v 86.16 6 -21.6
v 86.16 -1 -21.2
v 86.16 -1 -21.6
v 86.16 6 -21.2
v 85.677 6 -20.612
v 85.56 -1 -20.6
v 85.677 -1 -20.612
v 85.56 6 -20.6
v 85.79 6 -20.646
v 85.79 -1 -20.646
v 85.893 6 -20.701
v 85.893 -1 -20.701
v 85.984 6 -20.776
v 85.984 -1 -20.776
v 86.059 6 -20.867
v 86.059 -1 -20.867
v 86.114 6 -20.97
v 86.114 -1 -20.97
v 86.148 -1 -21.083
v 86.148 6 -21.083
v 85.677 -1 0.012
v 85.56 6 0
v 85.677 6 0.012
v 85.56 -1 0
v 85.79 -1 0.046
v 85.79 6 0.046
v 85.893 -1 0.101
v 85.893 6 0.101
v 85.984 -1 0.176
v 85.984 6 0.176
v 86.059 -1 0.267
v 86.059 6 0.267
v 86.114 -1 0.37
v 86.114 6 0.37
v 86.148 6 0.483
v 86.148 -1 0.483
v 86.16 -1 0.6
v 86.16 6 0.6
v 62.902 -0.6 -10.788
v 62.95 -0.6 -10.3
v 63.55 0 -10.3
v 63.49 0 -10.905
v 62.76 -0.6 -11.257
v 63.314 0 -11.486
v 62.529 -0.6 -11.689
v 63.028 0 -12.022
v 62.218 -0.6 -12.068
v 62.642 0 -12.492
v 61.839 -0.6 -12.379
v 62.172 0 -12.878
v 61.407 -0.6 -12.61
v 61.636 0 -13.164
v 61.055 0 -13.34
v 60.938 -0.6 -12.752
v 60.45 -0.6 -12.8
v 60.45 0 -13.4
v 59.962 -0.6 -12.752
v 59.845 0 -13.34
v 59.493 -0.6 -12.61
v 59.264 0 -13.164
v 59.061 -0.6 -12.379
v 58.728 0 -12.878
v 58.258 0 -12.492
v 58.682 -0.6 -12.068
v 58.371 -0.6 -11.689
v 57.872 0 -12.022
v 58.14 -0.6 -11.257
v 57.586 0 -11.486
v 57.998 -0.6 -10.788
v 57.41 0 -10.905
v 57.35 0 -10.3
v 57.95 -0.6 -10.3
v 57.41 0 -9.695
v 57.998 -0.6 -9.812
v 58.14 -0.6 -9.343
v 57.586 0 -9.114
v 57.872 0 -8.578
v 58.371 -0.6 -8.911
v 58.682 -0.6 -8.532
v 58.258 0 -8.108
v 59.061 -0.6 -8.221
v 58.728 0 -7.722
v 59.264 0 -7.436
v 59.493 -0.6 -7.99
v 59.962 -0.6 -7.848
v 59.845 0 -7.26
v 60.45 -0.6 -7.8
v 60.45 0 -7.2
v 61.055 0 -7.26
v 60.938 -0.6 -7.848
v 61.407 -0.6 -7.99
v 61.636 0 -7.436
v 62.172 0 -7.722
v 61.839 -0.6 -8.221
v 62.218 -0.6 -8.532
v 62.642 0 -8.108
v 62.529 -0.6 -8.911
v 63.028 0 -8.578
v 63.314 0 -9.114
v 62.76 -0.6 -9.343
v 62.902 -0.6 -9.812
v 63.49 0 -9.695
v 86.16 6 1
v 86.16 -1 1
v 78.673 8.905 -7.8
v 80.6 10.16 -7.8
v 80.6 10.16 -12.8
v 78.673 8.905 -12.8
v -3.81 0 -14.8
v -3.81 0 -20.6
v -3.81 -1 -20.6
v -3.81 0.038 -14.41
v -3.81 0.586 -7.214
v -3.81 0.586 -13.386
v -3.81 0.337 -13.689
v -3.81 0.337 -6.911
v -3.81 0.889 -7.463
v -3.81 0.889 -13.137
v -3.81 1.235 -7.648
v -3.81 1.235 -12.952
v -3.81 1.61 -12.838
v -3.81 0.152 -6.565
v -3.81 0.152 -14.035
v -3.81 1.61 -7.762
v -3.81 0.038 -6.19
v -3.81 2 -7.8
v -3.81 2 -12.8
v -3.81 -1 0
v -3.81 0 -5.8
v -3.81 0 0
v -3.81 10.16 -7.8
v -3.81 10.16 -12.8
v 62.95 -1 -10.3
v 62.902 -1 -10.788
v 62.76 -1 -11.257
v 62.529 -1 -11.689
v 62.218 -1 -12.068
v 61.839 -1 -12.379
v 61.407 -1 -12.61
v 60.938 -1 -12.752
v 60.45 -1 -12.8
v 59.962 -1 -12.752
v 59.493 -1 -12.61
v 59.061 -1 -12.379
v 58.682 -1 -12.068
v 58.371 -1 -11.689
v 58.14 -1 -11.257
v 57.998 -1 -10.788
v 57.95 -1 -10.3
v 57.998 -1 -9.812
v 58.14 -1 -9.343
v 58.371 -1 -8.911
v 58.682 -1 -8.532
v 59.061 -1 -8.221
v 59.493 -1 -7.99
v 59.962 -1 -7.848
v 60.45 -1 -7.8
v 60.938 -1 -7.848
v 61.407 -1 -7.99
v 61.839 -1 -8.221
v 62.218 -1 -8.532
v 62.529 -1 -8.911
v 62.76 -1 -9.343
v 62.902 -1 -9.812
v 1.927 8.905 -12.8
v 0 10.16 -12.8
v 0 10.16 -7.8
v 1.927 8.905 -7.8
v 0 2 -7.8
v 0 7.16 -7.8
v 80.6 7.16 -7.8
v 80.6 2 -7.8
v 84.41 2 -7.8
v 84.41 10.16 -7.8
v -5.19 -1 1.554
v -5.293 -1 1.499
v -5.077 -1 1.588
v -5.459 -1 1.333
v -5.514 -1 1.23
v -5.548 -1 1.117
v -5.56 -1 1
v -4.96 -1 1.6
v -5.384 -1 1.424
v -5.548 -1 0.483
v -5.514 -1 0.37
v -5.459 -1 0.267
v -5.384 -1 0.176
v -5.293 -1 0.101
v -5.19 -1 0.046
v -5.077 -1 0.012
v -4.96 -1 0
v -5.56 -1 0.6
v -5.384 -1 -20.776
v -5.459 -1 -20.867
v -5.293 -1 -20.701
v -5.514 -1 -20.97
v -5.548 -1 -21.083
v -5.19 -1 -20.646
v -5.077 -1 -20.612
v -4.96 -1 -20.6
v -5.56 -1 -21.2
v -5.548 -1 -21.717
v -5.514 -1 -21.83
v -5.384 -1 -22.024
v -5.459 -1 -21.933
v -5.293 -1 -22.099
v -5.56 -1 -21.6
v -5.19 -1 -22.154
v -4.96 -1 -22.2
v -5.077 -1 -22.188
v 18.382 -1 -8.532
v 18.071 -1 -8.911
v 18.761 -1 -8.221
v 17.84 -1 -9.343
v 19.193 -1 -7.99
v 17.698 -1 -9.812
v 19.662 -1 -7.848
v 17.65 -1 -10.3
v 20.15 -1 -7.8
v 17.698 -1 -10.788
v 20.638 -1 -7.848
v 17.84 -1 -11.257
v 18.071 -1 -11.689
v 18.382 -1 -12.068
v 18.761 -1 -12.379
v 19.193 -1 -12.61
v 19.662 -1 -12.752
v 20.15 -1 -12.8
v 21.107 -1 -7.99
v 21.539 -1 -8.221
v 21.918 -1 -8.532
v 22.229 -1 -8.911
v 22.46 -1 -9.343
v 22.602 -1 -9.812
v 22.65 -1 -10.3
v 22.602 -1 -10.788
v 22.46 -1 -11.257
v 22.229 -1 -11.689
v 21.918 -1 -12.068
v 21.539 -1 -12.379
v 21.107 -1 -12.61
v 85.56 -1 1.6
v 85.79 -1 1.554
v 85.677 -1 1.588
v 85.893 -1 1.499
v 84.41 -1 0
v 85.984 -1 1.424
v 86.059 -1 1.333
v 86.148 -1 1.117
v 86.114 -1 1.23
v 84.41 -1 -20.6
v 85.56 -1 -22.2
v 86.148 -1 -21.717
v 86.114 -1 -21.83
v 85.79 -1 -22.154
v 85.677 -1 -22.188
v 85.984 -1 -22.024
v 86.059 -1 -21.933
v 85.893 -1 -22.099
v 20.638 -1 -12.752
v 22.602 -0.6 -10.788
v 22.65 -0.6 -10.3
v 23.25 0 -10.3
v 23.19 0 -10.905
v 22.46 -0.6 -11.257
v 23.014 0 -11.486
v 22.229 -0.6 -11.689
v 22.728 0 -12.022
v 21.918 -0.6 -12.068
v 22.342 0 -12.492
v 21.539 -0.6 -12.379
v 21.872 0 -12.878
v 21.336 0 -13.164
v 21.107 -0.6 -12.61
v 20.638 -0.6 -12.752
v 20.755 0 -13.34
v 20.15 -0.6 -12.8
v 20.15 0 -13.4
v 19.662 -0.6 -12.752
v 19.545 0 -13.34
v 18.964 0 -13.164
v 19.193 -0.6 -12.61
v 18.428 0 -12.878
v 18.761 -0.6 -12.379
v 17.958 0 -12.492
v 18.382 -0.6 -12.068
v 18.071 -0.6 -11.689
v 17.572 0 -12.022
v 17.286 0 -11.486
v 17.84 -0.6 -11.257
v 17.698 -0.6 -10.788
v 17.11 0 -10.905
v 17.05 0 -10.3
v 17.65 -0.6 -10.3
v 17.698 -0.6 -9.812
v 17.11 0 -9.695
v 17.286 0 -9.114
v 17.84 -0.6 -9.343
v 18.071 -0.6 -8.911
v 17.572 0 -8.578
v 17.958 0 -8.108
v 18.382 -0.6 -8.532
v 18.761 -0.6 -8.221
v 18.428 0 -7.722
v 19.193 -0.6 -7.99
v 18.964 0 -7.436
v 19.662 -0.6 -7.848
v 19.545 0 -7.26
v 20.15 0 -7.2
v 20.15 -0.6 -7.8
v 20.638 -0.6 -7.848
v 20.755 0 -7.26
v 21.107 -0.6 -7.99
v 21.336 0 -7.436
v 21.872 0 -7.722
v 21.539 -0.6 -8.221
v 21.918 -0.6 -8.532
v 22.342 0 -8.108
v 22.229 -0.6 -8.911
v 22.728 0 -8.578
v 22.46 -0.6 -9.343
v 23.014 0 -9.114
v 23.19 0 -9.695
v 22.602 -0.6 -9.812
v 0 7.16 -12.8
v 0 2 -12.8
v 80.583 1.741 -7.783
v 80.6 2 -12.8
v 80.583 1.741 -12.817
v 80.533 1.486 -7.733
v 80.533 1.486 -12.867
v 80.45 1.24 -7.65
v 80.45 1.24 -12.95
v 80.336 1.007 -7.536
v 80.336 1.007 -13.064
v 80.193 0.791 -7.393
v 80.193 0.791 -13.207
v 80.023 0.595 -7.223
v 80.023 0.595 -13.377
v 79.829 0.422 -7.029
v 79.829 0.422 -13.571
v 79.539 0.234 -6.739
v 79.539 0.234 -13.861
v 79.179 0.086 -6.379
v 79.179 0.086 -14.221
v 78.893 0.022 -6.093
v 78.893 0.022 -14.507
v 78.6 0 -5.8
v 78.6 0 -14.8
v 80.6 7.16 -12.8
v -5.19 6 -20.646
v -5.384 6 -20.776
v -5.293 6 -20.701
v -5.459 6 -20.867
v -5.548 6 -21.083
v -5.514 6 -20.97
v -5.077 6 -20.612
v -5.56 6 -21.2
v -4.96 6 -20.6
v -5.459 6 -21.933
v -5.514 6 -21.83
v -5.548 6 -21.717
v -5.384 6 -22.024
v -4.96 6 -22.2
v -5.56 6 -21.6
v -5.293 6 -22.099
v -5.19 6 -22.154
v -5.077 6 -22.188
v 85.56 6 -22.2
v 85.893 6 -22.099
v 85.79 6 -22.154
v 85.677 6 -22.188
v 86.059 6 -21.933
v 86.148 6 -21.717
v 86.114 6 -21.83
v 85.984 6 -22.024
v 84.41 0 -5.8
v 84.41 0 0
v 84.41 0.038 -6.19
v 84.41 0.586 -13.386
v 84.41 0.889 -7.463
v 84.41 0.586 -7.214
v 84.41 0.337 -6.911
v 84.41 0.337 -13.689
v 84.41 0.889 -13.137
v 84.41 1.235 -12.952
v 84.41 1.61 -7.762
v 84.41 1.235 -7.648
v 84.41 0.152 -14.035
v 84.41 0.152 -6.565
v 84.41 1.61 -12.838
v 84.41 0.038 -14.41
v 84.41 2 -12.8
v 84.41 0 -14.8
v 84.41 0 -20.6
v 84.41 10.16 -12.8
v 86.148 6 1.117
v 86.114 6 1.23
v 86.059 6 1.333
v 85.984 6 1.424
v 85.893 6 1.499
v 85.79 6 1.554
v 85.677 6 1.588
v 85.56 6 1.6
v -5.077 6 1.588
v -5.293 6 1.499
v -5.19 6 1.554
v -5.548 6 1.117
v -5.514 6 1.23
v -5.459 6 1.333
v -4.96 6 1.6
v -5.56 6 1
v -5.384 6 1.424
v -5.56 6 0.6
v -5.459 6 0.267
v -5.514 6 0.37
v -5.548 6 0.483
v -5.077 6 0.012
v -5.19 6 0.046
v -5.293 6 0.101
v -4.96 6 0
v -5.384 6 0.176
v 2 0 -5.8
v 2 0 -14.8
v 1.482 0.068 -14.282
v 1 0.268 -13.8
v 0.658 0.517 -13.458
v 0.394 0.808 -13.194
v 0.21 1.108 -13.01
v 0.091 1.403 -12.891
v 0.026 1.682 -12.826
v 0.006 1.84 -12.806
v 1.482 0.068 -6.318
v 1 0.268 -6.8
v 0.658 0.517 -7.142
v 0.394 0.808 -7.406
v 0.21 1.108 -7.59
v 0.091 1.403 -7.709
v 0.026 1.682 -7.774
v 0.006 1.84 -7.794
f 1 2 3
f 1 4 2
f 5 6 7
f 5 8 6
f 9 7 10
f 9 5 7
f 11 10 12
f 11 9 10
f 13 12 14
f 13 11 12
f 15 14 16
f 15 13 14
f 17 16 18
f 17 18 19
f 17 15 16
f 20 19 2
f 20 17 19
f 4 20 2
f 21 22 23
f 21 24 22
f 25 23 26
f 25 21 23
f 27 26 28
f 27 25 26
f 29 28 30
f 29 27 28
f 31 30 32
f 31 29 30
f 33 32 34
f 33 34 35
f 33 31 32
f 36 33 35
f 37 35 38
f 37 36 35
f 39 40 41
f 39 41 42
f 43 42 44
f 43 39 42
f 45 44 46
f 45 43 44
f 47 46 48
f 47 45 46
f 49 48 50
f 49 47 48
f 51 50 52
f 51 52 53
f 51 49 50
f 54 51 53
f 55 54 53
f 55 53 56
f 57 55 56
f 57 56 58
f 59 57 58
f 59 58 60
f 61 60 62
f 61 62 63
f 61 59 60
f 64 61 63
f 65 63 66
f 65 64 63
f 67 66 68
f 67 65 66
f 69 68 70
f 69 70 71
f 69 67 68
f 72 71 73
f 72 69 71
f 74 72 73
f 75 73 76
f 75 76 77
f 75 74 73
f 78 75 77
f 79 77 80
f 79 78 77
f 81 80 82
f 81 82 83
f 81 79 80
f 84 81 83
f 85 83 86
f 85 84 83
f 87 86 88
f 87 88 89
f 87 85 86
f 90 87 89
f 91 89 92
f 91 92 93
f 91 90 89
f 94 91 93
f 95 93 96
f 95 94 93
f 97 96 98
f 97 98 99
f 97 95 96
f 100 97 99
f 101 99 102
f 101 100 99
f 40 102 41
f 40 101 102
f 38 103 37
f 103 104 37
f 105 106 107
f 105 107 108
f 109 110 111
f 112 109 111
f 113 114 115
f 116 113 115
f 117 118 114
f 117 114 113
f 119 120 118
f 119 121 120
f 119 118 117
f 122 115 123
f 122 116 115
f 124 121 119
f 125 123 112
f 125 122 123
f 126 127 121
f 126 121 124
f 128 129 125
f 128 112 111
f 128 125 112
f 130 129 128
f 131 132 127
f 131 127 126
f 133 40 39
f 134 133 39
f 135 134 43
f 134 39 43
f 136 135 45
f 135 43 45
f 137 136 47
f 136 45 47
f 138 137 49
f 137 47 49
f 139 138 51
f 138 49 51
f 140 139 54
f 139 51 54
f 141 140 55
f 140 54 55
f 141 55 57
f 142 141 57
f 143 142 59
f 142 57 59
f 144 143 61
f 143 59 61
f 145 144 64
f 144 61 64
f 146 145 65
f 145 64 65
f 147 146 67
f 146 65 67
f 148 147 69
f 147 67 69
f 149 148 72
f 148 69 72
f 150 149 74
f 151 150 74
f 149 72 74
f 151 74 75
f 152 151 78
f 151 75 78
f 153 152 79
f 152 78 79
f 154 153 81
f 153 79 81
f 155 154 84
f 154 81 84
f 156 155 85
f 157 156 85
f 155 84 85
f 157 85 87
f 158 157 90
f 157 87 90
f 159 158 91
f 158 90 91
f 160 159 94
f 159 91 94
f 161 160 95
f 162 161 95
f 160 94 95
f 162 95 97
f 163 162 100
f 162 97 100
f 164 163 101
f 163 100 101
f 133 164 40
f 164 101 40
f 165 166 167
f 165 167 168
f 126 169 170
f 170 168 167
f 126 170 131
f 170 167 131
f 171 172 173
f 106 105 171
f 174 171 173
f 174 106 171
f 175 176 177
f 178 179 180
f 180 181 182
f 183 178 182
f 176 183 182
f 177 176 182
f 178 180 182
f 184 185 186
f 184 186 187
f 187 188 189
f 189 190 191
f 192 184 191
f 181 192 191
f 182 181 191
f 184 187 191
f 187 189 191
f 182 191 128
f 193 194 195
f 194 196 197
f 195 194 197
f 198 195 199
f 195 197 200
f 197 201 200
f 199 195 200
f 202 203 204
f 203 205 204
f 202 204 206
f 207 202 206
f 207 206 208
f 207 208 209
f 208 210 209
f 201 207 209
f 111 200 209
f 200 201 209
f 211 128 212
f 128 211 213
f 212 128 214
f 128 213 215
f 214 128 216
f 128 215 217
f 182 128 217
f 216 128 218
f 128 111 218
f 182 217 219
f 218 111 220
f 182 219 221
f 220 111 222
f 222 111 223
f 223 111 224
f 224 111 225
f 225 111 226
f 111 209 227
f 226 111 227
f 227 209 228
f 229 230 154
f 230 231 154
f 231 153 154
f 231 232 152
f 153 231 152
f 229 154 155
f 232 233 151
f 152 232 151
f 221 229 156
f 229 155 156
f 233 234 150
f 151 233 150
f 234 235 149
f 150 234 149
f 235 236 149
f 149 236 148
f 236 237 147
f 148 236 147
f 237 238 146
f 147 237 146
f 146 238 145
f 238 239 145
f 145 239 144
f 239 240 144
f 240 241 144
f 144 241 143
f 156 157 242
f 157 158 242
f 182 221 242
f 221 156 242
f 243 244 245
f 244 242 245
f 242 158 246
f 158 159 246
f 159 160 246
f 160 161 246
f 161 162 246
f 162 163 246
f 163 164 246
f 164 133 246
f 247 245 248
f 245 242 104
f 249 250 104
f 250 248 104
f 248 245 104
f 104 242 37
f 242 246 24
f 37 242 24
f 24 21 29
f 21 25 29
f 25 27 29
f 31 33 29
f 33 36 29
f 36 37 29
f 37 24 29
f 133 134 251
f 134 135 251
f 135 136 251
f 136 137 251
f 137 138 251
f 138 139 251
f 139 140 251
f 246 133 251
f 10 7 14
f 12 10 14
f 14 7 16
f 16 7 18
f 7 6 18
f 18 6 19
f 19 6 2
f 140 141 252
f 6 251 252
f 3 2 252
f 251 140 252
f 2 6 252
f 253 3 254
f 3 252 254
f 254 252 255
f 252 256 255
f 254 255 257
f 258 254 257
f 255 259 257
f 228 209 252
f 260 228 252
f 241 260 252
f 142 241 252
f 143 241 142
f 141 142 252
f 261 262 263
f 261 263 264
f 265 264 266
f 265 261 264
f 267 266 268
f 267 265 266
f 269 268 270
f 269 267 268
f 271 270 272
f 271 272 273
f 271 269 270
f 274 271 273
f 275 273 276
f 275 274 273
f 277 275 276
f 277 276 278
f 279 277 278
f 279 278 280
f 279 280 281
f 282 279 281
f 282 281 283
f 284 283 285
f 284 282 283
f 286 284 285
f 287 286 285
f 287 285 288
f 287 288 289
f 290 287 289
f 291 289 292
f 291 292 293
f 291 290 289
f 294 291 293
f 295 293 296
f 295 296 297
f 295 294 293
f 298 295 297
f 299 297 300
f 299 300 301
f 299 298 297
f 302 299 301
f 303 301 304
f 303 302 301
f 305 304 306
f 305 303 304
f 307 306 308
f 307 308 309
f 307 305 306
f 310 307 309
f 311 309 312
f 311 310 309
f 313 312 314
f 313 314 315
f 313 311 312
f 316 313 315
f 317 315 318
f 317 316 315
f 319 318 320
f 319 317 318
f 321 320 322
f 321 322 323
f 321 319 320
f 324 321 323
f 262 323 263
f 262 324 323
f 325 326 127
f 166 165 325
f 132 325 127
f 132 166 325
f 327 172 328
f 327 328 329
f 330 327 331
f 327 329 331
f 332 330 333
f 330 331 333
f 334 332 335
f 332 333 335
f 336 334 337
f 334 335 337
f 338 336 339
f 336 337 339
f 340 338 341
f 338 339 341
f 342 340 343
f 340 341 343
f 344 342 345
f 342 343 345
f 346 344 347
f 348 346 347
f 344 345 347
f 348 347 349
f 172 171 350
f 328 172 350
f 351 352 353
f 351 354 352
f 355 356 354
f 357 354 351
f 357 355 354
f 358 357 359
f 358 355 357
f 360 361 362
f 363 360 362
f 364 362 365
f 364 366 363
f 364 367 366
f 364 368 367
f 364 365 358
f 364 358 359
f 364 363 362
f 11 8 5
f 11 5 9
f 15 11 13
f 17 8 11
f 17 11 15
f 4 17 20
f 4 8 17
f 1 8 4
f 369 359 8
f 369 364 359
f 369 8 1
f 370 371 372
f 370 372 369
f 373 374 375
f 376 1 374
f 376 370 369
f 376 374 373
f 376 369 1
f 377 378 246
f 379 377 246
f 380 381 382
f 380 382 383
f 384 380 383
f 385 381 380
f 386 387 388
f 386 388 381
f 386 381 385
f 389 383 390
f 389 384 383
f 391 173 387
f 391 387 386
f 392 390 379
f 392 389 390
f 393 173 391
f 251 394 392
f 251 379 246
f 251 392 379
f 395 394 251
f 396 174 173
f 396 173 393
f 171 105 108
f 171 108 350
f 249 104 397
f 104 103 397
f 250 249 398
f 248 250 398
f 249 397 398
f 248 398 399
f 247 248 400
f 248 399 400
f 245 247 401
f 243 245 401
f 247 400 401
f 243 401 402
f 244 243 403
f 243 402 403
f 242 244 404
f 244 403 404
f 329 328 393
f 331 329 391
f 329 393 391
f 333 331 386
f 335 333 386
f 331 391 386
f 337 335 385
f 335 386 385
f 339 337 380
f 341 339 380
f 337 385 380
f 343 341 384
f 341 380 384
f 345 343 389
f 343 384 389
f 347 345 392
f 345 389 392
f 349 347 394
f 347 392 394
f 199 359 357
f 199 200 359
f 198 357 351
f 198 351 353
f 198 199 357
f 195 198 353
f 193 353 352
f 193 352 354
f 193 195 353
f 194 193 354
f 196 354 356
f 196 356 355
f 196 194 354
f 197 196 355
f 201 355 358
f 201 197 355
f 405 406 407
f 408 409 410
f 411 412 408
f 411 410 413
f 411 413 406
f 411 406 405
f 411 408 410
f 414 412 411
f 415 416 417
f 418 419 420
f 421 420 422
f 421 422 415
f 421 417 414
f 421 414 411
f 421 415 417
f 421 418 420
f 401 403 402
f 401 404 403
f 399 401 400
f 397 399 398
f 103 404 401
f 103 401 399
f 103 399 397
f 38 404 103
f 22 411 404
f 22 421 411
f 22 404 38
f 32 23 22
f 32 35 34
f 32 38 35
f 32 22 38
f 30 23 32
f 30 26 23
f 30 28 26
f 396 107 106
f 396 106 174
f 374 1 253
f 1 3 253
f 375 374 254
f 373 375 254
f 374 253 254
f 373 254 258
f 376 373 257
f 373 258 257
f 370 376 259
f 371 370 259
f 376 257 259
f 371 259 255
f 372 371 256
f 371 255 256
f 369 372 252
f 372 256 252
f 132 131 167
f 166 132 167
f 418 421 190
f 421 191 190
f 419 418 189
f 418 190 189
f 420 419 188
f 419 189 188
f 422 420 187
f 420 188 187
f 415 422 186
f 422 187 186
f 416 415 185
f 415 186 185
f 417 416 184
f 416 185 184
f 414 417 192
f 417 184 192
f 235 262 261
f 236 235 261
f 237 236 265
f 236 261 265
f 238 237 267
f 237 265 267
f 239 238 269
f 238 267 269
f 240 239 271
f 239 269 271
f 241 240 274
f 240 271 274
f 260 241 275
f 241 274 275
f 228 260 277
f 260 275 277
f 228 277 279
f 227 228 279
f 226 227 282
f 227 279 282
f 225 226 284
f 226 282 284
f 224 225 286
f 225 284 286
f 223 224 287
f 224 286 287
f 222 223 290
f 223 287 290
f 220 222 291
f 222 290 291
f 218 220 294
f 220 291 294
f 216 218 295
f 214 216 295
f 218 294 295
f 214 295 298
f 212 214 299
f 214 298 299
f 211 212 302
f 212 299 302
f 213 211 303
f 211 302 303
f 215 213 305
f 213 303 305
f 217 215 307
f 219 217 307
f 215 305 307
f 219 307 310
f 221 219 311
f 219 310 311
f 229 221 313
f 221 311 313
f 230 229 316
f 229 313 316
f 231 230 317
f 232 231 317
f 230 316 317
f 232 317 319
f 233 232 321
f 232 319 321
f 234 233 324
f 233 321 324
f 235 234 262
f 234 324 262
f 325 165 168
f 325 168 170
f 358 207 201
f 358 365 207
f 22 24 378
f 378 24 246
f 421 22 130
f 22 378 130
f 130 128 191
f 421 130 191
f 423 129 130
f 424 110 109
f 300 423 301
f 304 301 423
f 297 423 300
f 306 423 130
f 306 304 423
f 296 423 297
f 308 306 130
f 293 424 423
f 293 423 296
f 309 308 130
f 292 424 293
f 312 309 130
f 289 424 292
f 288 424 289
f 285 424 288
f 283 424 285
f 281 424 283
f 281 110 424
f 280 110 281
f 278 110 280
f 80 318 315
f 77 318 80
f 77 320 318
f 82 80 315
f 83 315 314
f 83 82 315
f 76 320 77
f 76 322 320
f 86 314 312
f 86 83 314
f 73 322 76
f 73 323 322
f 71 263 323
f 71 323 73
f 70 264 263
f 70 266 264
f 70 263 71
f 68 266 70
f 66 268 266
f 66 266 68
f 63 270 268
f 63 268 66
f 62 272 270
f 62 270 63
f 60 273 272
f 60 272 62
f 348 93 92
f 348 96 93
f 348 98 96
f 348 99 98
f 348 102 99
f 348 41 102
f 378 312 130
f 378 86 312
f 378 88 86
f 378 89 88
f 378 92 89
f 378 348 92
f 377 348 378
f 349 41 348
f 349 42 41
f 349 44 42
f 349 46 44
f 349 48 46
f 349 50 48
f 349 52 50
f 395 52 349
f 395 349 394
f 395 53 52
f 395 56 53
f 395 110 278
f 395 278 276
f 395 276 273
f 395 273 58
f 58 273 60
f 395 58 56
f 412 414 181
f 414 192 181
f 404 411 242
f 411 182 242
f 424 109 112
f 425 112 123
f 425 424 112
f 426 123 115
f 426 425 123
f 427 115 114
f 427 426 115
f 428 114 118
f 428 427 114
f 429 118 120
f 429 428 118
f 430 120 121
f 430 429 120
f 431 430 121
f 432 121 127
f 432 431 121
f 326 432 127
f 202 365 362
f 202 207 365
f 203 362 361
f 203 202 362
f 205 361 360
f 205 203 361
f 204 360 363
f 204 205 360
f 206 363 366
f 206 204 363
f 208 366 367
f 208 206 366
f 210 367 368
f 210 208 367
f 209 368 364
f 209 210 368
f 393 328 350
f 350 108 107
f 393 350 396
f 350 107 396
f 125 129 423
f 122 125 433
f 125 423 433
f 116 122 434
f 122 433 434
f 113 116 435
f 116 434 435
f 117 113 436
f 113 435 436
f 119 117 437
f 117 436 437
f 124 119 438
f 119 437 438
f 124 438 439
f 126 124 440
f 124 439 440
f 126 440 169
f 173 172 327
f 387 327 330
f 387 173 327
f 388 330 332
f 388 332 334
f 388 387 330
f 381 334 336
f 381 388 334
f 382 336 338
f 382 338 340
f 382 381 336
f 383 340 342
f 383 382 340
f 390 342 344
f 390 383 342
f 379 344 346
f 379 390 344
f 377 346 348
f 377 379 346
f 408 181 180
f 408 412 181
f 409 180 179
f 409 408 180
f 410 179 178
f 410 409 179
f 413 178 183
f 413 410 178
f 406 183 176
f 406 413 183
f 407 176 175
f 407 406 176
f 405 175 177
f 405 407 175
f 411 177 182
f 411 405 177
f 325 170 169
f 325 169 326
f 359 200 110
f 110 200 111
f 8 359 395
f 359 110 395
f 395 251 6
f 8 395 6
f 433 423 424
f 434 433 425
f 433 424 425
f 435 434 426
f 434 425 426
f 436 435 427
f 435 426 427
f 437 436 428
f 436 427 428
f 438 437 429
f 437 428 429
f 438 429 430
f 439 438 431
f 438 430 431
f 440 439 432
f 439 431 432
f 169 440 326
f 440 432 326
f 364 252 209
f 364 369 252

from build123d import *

# Parameters (mm, degrees)
SKETCH1_R           = 2.5
BOSS_EXTRUDE1_DEPTH = 1
SKETCH1_3_W         = 3.81
SKETCH1_3_H         = 5
BOSS_EXTRUDE2_DEPTH = 10.16
BOSS_EXTRUDE3_DEPTH = 6
BOSS_EXTRUDE4_DEPTH = 5
FILLET2_R           = 2
CHAMFER1_SIZE       = 0.6
FILLET3_R           = 0.6


with BuildPart() as part:
    # Sketch1 → Boss-Extrude1 (new body)
    with BuildSketch(Plane(origin=(0, 0, 0), x_dir=(1, 0, 0), z_dir=(0, 1, 0))):
        Polygon((-3.81, 0), (-5.56, 0), (-5.56, -1.6), (86.16, -1.6), (86.16, 0), (84.41, 0), (84.41, 20.6), (86.16, 20.6), (86.16, 22.2), (-5.56, 22.2), (-5.56, 20.6), (-3.81, 20.6), align=None)
        with Locations((20.15, 10.3)):
            Circle(SKETCH1_R, mode=Mode.SUBTRACT)
        with Locations((60.45, 10.3)):
            Circle(SKETCH1_R, mode=Mode.SUBTRACT)
    extrude(amount=-BOSS_EXTRUDE1_DEPTH)

    # Sketch1<3> → Boss-Extrude2 (add)
    with BuildSketch(Plane(origin=(0, 0, 0), x_dir=(1, 0, 0), z_dir=(0, 1, 0))):
        with Locations((-1.905, 10.3)):
            Rectangle(SKETCH1_3_W, SKETCH1_3_H)
        with Locations((82.505, 10.3)):
            Rectangle(SKETCH1_3_W, SKETCH1_3_H)
    extrude(amount=BOSS_EXTRUDE2_DEPTH)

    # Sketch1<4> → Boss-Extrude3 (add)
    with BuildSketch(Plane(origin=(0, 0, 0), x_dir=(1, 0, 0), z_dir=(0, 1, 0))):
        Polygon((80.6, 0), (0, 0), (-3.81, 0), (-5.56, 0), (-5.56, -1.6), (86.16, -1.6), (86.16, 0), (84.41, 0), align=None)
        Polygon((-3.81, 20.6), (0, 20.6), (80.6, 20.6), (84.41, 20.6), (86.16, 20.6), (86.16, 22.2), (-5.56, 22.2), (-5.56, 20.6), align=None)
    extrude(amount=BOSS_EXTRUDE3_DEPTH)

    # Sketch2 → Boss-Extrude4 (add)
    with BuildSketch(Plane.XY.offset(-7.8)):
        Polygon((0, 10.16), (1.927427041, 8.905), (0, 7.16), align=None)
    boss_extrude4 = extrude(amount=-BOSS_EXTRUDE4_DEPTH)

    # Mirror1: Boss-Extrude4 across plane
    add(boss_extrude4.mirror(Plane(origin=(40.3, 0, 0), x_dir=(0, 0, 1), z_dir=(1, 0, 0))))

    # Fillet2
    fillet2_edges = [part.edges().sort_by_distance(p)[0] for p in [
        (0, 0, -10.3),
        (-1.905, 0, -12.8),
        (-1.905, 0, -7.8),
        (82.505, 0, -7.8),
        (80.6, 0, -10.3),
        (82.505, 0, -12.8),
    ]]
    fillet(fillet2_edges, radius=FILLET2_R)

    # Chamfer1
    chamfer1_edges = [part.edges().sort_by_distance(p)[0] for p in [
        (17.65, 0, -10.3),
        (57.95, 0, -10.3),
    ]]
    chamfer(chamfer1_edges, length=CHAMFER1_SIZE)

    # Fillet3
    fillet3_edges = [part.edges().sort_by_distance(p)[0] for p in [
        (-5.56, 2.5, -20.6),
        (-5.56, 2.5, -22.2),
        (86.16, 2.5, -22.2),
        (86.16, 2.5, -20.6),
        (86.16, 2.5, 0),
        (86.16, 2.5, 1.6),
        (-5.56, 2.5, 1.6),
        (-5.56, 2.5, 0),
    ]]
    fillet(fillet3_edges, radius=FILLET3_R)


solid = part.part
